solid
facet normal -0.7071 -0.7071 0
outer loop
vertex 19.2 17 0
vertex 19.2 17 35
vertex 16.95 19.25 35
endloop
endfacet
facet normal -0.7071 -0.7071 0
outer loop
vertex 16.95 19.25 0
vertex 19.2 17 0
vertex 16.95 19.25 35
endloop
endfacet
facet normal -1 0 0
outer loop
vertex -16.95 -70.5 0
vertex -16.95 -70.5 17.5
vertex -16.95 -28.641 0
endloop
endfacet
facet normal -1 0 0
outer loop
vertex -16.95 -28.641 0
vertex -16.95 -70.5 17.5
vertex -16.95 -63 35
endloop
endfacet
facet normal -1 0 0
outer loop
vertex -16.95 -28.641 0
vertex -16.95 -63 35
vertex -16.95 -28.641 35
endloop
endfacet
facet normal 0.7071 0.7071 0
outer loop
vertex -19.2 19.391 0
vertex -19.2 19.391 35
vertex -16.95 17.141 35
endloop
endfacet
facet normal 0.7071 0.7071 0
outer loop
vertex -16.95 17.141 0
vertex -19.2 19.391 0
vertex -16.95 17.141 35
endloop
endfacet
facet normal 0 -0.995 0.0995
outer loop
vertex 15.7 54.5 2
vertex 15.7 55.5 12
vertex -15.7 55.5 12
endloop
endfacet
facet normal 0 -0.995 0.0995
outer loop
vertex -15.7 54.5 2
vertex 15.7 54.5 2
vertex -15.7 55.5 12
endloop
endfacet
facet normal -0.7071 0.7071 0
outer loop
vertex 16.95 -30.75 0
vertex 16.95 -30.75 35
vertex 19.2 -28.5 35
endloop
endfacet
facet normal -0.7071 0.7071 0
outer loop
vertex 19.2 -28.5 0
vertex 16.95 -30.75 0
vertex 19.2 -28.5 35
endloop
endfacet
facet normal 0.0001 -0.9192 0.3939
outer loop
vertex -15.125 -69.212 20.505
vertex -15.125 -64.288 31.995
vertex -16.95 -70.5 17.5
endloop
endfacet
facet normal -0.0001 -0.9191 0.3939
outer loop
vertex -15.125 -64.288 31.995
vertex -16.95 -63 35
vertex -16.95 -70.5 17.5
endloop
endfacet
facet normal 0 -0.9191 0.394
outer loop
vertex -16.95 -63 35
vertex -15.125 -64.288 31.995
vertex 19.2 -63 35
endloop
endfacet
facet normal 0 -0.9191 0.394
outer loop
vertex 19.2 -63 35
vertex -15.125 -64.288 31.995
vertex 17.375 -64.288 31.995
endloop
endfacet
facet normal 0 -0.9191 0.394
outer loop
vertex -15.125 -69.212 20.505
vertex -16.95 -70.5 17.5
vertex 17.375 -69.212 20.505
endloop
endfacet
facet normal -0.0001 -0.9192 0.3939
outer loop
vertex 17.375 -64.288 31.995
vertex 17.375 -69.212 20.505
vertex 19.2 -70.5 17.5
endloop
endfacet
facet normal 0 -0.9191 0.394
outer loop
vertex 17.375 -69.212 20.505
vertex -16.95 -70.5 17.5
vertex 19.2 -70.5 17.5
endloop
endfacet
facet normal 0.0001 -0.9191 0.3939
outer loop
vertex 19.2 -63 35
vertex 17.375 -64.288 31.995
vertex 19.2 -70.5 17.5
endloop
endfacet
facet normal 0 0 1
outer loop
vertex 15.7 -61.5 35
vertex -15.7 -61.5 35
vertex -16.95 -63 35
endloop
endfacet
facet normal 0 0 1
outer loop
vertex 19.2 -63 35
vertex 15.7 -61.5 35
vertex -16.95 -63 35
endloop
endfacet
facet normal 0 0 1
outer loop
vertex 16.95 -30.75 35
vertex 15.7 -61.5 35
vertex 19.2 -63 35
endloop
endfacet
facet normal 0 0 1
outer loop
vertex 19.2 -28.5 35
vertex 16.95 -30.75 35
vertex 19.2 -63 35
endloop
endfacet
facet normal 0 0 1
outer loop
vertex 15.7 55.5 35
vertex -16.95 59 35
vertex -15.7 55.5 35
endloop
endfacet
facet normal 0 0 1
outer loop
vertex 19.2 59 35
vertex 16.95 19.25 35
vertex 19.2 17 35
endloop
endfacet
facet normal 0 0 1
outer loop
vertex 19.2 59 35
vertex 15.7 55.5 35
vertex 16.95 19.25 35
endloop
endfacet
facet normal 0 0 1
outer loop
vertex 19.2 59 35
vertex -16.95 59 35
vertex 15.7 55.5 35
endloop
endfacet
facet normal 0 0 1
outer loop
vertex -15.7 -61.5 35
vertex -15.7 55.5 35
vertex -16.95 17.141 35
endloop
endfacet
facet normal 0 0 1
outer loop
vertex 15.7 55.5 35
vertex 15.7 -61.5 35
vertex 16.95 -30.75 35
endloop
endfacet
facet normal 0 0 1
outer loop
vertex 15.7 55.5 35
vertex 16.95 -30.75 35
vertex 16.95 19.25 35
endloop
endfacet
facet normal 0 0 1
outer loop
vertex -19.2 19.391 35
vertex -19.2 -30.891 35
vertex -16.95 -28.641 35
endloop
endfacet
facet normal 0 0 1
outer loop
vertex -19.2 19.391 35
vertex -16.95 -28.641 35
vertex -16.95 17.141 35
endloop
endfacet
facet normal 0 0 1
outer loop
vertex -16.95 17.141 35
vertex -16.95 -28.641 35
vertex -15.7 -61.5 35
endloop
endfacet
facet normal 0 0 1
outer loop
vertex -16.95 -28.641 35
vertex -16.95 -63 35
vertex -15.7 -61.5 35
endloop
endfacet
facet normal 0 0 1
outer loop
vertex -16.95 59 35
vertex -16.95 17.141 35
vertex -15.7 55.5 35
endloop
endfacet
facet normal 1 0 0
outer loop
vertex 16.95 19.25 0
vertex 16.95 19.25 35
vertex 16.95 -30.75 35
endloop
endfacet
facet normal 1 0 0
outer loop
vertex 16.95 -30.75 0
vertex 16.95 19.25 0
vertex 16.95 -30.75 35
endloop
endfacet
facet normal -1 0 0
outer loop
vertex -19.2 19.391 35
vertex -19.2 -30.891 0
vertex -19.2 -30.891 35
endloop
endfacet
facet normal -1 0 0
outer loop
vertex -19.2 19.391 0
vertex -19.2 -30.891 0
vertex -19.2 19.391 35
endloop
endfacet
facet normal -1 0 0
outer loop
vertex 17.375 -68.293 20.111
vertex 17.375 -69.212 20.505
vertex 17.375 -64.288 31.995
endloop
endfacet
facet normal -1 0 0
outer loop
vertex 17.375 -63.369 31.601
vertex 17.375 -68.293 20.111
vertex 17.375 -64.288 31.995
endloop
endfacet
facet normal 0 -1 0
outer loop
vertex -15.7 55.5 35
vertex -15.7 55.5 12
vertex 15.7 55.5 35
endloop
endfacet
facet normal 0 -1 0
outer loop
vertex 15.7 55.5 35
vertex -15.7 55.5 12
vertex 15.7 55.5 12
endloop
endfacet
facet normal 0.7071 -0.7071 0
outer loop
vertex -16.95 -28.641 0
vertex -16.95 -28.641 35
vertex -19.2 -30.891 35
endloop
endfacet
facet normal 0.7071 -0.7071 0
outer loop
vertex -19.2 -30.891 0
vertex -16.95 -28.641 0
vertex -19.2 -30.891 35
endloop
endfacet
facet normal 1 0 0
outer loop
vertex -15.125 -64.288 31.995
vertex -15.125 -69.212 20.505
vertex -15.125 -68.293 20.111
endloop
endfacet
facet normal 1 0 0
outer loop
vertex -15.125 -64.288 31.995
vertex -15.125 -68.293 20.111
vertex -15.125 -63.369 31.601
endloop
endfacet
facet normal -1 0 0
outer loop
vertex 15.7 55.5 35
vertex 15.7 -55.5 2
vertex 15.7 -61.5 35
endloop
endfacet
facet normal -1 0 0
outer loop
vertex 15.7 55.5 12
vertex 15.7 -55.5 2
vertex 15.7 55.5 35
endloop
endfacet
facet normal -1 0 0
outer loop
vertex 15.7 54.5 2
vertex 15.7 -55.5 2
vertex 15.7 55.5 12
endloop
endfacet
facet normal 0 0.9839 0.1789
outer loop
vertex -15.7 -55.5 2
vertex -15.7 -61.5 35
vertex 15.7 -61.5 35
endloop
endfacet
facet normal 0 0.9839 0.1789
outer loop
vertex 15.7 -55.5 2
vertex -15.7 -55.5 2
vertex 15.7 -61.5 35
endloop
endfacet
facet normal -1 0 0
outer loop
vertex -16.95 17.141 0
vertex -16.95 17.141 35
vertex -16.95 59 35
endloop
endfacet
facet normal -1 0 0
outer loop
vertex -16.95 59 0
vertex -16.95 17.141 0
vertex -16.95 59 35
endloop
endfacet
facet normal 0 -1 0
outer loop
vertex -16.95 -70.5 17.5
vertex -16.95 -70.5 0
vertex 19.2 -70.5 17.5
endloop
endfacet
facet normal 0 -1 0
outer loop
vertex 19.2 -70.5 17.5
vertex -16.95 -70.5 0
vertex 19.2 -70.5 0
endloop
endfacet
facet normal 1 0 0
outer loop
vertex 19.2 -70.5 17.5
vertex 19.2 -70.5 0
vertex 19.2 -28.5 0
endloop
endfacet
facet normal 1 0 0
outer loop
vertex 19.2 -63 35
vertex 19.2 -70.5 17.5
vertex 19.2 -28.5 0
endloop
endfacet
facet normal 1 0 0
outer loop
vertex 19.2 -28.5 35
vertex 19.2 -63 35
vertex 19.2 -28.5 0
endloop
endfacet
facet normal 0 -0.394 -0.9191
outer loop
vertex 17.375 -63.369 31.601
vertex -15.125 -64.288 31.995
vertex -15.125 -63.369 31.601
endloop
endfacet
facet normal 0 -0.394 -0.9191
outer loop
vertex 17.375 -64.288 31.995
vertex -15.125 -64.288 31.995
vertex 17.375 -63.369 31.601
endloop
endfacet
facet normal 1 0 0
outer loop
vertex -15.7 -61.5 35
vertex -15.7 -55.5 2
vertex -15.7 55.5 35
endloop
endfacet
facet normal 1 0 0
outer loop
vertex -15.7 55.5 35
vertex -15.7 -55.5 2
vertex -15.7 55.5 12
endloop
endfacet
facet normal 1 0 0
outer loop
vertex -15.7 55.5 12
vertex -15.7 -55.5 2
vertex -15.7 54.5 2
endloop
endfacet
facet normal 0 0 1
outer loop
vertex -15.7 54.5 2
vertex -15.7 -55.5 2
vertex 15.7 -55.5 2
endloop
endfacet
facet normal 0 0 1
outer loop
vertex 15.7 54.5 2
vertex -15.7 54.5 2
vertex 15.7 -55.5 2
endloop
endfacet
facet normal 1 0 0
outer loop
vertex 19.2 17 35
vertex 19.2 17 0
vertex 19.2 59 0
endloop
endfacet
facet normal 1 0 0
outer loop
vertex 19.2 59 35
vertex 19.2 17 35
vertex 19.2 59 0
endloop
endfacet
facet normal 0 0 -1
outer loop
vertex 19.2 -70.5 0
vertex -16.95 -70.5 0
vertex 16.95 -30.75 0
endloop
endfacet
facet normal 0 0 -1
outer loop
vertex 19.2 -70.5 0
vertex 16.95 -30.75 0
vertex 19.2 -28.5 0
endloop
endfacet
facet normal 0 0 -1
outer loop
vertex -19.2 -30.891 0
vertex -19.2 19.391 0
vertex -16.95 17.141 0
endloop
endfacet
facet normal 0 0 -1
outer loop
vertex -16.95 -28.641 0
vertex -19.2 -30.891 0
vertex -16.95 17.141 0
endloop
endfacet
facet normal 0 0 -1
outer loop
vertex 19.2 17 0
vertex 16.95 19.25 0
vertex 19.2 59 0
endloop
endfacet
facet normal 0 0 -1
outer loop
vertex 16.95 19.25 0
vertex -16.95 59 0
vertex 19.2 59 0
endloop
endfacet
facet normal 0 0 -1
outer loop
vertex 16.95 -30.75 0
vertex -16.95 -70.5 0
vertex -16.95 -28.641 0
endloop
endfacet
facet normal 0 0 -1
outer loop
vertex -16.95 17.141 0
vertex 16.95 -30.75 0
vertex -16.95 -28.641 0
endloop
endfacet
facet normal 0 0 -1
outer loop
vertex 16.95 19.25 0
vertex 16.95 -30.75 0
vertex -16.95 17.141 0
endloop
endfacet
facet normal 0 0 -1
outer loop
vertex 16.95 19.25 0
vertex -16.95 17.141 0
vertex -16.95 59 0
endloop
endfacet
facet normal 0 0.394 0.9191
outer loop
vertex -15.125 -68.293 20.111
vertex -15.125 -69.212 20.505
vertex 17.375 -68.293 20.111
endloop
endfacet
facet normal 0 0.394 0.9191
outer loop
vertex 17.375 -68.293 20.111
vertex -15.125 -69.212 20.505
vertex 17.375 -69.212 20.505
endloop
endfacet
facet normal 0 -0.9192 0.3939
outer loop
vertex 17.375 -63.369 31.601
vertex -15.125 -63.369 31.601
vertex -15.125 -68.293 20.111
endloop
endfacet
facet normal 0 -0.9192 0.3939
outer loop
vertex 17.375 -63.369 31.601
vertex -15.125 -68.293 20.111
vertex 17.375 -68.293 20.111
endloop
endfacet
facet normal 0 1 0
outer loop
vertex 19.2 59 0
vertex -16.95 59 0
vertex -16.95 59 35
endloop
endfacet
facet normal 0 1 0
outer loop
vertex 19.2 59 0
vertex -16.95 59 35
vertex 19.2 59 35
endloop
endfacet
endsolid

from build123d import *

# Parameters (mm, degrees)
F0_W     = 38.4
F0_H     = 129.5
F0_W_2   = 31.4
F0_H_2   = 111
F1_DEPTH = 2
F2_DEPTH = 35
F3_SIZE2 = 17.5
F3_SIZE  = 7.5
F4_SIZE2 = 32.99999
F4_SIZE  = 5.99999
F6_DEPTH = 35.001
F7_W     = 32.5
F7_H     = 12.5
F8_DEPTH = 1
F9_SIZE2 = 10
F9_SIZE  = 1


# Not quite as in the source:
# - a fillet or chamfer is up to 0.001 mm smaller than in the source, because OpenCascade refuses the exact size


with BuildPart() as f1:
    # F0 (on Top) → F1 (new body)
    with BuildSketch(Plane.XY):
        with Locations((0, -5.75)):
            Rectangle(F0_W, F0_H)
        Rectangle(F0_W_2, F0_H_2, mode=Mode.SUBTRACT)
        Rectangle(F0_W_2, F0_H_2)
    extrude(amount=F1_DEPTH)

    # F0 (on Top) → F2 (join)
    with BuildSketch(Plane.XY):
        with Locations((0, -5.75)):
            Rectangle(F0_W, F0_H)
        Rectangle(F0_W_2, F0_H_2, mode=Mode.SUBTRACT)
    extrude(amount=F2_DEPTH)

    # F3
    f3_edges = [f1.edges().sort_by_distance(p)[0] for p in [
        (0, -70.5, 35),
    ]]
    f3_side = f1.faces().sort_by_distance((0, -69.149266, 35))[0]
    chamfer(f3_edges, length=F3_SIZE, length2=F3_SIZE2, reference=f3_side)

    # F4 (size 6 and 33 in the source; OpenCascade refuses exactly that, so slightly less here)
    f4_edges = [f1.edges().sort_by_distance(p)[0] for p in [
        (0, -55.5, 35),
    ]]
    f4_side = f1.faces().sort_by_distance((17.920994, -2, 35))[0]
    chamfer(f4_edges, length=F4_SIZE, length2=F4_SIZE2, reference=f4_side)

    # F5 (on face) → F6 (cut, through all)
    with BuildSketch(Plane.XY.offset(35)):
        Polygon((19.2, -28.5), (19.2, 17), (16.95, 19.25), (16.95, -30.75), align=None)
        Polygon((-19.2, 19.3914213562), (-16.95, 17.1414213562), (-16.95, 59), (-19.2, 59), align=None)
        Polygon((-16.95, -70.5), (-16.95, -28.6414213562), (-19.2, -30.8914213562), (-19.2, -70.5), align=None)
    extrude(amount=-F6_DEPTH, mode=Mode.SUBTRACT)

    # F7 (on face) → F8 (cut)
    with BuildSketch(Plane(origin=(0, -65.8965517241, 28.2413793103), x_dir=(1, 0, 0), z_dir=(0, -0.91914503, 0.3939192986))):
        with Locations((1.125, -2.1665561422)):
            Rectangle(F7_W, F7_H)
    extrude(amount=-F8_DEPTH, mode=Mode.SUBTRACT)

    # F9
    f9_edges = [f1.edges().sort_by_distance(p)[0] for p in [
        (0, 55.5, 2),
    ]]
    f9_side = f1.faces().sort_by_distance((0, 0, 2))[0]
    chamfer(f9_edges, length=F9_SIZE, length2=F9_SIZE2, reference=f9_side)


solid = f1.part
